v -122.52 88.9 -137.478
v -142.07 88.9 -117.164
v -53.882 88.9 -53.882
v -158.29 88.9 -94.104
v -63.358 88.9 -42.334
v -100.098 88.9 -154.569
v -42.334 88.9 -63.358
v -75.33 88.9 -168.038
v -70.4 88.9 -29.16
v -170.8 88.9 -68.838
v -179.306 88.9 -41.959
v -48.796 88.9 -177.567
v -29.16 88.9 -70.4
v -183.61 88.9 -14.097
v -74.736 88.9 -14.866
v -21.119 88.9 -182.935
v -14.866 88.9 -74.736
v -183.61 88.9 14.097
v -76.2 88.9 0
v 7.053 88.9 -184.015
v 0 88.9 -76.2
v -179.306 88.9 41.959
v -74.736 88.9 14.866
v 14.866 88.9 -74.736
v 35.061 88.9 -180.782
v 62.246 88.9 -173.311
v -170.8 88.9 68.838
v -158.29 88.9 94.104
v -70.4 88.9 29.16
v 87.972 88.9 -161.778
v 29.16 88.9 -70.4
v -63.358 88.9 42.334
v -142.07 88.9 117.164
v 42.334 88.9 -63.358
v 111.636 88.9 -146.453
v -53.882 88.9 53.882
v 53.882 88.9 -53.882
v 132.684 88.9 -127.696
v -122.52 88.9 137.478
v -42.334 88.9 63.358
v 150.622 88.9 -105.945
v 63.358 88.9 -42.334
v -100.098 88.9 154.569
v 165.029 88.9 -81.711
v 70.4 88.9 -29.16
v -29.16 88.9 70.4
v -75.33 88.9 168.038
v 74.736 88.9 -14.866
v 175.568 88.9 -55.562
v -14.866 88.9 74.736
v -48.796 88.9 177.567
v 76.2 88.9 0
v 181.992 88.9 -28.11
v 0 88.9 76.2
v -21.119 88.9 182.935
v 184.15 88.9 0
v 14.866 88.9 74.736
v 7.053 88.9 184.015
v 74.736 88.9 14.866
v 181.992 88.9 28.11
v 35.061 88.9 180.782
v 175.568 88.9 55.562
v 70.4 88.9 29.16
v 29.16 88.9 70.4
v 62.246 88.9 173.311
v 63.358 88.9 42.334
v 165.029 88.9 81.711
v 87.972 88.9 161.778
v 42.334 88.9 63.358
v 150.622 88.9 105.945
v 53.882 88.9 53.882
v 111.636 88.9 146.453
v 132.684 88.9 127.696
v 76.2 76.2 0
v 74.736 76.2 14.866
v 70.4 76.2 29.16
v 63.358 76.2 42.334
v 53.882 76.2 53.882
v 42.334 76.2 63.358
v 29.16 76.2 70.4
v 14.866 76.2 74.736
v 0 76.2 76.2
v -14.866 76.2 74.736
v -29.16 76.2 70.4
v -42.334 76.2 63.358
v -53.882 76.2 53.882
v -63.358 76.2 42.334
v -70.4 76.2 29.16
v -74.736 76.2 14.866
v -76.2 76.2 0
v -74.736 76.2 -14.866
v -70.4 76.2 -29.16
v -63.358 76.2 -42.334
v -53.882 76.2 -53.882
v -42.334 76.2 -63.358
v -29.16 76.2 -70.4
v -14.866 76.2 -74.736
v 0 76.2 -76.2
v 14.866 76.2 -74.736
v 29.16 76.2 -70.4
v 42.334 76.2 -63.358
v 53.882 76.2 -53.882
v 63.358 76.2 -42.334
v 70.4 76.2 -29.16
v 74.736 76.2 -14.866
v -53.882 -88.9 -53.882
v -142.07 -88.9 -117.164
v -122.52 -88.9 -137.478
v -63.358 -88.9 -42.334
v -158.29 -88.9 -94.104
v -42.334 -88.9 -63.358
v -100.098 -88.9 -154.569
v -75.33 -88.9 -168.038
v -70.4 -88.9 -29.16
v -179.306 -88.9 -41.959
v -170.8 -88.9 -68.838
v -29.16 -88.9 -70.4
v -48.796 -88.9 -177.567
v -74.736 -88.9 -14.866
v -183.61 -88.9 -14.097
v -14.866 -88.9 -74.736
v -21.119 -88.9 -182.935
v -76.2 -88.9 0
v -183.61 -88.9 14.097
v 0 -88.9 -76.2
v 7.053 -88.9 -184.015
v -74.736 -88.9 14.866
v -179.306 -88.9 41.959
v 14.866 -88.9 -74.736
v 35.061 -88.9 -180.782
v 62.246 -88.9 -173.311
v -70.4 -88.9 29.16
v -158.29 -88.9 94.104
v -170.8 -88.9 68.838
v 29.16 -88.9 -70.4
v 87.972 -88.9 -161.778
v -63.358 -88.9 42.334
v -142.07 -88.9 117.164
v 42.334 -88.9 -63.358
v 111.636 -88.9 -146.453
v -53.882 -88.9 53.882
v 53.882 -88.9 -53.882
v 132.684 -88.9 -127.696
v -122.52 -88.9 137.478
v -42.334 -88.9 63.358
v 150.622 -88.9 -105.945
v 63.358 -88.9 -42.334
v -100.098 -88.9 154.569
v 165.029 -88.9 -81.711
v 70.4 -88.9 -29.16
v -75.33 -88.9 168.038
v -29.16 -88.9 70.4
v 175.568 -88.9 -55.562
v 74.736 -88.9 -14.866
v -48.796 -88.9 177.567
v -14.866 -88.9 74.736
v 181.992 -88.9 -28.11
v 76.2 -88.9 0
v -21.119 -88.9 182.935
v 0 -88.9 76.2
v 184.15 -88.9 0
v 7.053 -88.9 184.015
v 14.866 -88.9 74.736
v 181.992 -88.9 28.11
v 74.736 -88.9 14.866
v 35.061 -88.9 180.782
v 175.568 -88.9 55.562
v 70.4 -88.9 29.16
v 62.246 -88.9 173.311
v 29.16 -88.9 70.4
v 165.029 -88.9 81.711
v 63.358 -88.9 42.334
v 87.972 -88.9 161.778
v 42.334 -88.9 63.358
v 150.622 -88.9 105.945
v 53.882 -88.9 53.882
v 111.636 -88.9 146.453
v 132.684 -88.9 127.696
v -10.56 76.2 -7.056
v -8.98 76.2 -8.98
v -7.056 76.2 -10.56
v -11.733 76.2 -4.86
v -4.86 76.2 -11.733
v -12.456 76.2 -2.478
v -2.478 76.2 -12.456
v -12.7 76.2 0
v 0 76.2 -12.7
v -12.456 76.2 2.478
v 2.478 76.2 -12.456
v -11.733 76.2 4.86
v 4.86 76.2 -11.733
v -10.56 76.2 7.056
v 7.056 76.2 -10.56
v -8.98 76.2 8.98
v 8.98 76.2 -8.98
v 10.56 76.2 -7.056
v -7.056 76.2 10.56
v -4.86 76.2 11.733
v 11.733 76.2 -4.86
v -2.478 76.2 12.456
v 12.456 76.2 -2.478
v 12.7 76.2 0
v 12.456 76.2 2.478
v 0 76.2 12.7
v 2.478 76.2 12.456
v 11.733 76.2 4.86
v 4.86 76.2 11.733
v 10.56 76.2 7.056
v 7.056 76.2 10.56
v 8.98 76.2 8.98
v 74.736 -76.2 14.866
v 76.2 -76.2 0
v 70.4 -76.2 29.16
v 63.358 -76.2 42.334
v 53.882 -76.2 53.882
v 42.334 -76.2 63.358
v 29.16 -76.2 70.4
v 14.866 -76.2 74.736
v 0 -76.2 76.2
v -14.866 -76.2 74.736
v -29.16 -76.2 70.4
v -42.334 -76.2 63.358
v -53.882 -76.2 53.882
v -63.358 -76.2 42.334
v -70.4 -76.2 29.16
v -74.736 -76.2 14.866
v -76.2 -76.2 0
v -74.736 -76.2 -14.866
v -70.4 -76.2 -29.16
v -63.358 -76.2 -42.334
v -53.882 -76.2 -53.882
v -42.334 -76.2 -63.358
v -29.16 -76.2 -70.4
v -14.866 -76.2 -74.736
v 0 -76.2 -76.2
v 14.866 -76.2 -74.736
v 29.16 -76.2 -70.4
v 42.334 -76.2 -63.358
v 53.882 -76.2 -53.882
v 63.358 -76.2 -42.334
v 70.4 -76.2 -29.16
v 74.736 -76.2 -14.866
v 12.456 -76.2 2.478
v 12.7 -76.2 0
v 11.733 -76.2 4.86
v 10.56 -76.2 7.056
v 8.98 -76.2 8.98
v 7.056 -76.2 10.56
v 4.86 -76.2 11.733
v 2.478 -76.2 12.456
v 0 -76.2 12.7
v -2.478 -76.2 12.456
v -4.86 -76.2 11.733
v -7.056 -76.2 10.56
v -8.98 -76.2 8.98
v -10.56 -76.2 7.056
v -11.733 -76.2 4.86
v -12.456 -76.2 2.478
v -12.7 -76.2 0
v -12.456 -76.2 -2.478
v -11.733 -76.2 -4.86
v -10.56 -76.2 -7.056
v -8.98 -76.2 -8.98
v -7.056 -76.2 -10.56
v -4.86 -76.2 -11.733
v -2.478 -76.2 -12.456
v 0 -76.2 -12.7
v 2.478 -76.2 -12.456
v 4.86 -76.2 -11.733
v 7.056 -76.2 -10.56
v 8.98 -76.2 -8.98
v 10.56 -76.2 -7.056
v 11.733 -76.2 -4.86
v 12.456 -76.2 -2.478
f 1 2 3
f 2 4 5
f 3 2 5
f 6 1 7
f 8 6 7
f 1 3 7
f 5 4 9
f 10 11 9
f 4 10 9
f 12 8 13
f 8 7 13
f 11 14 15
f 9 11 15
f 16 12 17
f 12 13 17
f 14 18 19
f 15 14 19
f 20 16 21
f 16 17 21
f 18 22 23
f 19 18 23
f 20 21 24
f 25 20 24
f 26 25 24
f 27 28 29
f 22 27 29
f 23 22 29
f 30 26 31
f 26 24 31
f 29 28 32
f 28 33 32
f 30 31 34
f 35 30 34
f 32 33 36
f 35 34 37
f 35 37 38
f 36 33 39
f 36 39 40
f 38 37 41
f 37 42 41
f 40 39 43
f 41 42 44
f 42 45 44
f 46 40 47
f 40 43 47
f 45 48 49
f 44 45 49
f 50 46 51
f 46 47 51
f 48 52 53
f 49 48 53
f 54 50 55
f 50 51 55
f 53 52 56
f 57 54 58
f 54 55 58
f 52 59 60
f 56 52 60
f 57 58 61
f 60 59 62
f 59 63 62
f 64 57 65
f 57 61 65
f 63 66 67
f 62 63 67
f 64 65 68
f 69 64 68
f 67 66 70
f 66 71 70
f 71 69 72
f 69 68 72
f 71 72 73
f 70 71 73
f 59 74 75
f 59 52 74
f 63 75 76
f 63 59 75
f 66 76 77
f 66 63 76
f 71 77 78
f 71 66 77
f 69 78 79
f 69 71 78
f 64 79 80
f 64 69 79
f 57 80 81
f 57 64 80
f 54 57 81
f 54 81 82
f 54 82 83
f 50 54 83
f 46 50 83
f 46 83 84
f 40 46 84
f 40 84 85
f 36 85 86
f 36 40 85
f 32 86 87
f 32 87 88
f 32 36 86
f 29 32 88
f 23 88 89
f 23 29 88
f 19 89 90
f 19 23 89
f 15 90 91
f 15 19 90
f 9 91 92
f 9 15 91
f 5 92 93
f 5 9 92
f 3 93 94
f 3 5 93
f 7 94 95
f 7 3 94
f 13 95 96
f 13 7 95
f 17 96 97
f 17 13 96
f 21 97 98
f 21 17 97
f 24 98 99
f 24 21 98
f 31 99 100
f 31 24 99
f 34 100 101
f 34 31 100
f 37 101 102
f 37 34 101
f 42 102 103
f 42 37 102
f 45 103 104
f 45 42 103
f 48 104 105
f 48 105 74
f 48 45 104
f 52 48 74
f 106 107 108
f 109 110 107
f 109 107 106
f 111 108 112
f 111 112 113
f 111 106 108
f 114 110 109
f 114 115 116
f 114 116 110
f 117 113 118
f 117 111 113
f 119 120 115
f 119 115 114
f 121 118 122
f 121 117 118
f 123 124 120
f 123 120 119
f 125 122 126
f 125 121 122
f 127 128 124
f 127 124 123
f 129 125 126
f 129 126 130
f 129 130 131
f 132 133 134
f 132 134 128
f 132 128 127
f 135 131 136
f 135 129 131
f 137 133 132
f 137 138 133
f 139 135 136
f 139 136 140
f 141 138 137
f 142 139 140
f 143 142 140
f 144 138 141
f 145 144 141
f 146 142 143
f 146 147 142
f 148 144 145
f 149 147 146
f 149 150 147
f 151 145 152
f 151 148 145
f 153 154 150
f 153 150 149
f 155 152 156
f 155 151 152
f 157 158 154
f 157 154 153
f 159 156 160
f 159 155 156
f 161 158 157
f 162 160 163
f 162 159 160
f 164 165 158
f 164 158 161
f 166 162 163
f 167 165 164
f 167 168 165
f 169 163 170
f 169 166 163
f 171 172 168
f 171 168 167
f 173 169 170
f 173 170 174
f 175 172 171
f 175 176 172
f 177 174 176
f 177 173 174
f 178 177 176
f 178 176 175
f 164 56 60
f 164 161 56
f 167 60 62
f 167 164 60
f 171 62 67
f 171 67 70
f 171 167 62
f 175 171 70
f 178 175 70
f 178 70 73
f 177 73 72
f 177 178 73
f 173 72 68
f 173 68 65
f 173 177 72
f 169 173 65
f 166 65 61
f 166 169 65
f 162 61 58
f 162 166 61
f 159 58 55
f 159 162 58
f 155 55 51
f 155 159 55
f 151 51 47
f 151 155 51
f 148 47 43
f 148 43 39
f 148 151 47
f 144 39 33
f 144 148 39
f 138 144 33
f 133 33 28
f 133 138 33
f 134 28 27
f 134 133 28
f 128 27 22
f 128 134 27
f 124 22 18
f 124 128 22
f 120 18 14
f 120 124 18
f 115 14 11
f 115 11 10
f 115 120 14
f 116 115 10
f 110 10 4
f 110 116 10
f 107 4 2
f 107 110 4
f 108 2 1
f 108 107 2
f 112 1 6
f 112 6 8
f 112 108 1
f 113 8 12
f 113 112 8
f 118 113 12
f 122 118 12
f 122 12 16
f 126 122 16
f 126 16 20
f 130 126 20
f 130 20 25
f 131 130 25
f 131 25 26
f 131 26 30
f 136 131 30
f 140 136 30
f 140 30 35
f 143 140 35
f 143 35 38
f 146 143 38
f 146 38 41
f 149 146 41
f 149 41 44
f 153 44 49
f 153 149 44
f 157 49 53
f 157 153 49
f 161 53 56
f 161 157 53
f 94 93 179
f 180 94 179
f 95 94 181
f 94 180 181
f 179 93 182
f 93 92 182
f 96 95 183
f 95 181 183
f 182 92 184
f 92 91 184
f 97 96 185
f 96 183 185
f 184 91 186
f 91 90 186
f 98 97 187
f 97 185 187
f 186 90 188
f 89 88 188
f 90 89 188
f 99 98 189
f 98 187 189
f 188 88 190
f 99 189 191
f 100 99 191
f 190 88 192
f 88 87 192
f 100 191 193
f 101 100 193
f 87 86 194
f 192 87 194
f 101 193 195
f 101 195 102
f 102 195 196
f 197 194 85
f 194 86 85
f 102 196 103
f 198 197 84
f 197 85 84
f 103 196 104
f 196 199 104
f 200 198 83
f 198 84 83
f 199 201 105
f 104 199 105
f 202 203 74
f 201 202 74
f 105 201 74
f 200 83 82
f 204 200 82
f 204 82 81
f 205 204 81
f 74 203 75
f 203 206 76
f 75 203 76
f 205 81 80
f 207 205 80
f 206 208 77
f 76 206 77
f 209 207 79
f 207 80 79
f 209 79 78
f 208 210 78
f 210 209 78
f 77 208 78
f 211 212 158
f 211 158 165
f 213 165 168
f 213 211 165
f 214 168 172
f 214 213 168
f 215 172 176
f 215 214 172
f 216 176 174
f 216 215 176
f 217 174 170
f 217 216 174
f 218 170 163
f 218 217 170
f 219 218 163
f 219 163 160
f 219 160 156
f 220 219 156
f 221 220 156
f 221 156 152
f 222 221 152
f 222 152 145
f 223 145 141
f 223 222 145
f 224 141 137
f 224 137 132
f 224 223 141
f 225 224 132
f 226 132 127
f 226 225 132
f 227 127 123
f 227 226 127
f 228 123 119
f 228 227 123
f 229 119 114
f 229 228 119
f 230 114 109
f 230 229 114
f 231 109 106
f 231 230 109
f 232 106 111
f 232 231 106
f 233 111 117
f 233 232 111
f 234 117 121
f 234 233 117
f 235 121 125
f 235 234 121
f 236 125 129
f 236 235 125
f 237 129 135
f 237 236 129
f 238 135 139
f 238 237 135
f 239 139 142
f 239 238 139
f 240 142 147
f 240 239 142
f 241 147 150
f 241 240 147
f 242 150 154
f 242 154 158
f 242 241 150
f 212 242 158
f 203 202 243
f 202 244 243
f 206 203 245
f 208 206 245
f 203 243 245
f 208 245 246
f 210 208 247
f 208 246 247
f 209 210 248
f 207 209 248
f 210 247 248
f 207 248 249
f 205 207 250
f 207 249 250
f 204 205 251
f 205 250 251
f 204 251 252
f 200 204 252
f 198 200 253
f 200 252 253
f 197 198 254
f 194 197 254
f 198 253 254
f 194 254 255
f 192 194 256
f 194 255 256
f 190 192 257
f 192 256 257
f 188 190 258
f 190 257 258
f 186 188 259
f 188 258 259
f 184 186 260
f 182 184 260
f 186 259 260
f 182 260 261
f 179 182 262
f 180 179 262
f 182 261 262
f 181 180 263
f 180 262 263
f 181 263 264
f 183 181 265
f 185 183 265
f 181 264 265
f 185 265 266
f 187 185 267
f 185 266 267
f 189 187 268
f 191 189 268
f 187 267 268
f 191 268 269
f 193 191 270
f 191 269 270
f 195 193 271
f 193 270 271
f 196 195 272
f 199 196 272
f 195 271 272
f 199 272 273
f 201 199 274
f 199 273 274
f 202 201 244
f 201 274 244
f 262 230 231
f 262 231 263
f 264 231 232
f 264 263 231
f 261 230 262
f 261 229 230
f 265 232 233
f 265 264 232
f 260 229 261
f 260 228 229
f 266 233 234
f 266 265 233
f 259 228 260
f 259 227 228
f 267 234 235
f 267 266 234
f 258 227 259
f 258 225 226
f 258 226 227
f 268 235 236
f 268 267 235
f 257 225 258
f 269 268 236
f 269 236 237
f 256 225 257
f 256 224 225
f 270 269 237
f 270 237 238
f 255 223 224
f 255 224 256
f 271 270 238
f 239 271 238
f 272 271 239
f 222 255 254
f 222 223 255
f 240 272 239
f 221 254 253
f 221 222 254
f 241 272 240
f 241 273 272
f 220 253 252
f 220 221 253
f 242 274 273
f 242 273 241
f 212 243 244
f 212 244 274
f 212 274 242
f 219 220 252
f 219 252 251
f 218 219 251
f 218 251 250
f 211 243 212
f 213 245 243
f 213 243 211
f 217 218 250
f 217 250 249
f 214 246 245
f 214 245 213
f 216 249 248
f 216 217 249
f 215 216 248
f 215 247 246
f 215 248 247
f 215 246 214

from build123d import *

# Parameters (mm, degrees)
F0_R     = 184.15
F0_R_2   = 76.2
F1_DEPTH = 88.9
F2_R     = 76.2
F3_DEPTH = 76.2
F4_R     = 12.7
F5_DEPTH = 76.2
F6_R     = 12.7
F7_DEPTH = 76.2


with BuildPart() as f1:
    # F0 (on Front) → F1 (new body, symmetric)
    with BuildSketch(Plane.XZ):
        Circle(F0_R)
        Circle(F0_R_2, mode=Mode.SUBTRACT)
    extrude(amount=F1_DEPTH, both=True)

    # F2 (on Front) → F3 (join, symmetric)
    with BuildSketch(Plane.XZ):
        Circle(F2_R)
    extrude(amount=F3_DEPTH, both=True)

    # F4 (on face) → F5 (cut, symmetric)
    with BuildSketch(Plane.XZ.offset(76.2)):
        Circle(F4_R)
    extrude(amount=F5_DEPTH, both=True, mode=Mode.SUBTRACT)

    # F6 (on face) → F7 (cut, symmetric)
    with BuildSketch(Plane.XZ):
        Circle(F6_R)
    extrude(amount=F7_DEPTH, both=True, mode=Mode.SUBTRACT)


solid = f1.part
